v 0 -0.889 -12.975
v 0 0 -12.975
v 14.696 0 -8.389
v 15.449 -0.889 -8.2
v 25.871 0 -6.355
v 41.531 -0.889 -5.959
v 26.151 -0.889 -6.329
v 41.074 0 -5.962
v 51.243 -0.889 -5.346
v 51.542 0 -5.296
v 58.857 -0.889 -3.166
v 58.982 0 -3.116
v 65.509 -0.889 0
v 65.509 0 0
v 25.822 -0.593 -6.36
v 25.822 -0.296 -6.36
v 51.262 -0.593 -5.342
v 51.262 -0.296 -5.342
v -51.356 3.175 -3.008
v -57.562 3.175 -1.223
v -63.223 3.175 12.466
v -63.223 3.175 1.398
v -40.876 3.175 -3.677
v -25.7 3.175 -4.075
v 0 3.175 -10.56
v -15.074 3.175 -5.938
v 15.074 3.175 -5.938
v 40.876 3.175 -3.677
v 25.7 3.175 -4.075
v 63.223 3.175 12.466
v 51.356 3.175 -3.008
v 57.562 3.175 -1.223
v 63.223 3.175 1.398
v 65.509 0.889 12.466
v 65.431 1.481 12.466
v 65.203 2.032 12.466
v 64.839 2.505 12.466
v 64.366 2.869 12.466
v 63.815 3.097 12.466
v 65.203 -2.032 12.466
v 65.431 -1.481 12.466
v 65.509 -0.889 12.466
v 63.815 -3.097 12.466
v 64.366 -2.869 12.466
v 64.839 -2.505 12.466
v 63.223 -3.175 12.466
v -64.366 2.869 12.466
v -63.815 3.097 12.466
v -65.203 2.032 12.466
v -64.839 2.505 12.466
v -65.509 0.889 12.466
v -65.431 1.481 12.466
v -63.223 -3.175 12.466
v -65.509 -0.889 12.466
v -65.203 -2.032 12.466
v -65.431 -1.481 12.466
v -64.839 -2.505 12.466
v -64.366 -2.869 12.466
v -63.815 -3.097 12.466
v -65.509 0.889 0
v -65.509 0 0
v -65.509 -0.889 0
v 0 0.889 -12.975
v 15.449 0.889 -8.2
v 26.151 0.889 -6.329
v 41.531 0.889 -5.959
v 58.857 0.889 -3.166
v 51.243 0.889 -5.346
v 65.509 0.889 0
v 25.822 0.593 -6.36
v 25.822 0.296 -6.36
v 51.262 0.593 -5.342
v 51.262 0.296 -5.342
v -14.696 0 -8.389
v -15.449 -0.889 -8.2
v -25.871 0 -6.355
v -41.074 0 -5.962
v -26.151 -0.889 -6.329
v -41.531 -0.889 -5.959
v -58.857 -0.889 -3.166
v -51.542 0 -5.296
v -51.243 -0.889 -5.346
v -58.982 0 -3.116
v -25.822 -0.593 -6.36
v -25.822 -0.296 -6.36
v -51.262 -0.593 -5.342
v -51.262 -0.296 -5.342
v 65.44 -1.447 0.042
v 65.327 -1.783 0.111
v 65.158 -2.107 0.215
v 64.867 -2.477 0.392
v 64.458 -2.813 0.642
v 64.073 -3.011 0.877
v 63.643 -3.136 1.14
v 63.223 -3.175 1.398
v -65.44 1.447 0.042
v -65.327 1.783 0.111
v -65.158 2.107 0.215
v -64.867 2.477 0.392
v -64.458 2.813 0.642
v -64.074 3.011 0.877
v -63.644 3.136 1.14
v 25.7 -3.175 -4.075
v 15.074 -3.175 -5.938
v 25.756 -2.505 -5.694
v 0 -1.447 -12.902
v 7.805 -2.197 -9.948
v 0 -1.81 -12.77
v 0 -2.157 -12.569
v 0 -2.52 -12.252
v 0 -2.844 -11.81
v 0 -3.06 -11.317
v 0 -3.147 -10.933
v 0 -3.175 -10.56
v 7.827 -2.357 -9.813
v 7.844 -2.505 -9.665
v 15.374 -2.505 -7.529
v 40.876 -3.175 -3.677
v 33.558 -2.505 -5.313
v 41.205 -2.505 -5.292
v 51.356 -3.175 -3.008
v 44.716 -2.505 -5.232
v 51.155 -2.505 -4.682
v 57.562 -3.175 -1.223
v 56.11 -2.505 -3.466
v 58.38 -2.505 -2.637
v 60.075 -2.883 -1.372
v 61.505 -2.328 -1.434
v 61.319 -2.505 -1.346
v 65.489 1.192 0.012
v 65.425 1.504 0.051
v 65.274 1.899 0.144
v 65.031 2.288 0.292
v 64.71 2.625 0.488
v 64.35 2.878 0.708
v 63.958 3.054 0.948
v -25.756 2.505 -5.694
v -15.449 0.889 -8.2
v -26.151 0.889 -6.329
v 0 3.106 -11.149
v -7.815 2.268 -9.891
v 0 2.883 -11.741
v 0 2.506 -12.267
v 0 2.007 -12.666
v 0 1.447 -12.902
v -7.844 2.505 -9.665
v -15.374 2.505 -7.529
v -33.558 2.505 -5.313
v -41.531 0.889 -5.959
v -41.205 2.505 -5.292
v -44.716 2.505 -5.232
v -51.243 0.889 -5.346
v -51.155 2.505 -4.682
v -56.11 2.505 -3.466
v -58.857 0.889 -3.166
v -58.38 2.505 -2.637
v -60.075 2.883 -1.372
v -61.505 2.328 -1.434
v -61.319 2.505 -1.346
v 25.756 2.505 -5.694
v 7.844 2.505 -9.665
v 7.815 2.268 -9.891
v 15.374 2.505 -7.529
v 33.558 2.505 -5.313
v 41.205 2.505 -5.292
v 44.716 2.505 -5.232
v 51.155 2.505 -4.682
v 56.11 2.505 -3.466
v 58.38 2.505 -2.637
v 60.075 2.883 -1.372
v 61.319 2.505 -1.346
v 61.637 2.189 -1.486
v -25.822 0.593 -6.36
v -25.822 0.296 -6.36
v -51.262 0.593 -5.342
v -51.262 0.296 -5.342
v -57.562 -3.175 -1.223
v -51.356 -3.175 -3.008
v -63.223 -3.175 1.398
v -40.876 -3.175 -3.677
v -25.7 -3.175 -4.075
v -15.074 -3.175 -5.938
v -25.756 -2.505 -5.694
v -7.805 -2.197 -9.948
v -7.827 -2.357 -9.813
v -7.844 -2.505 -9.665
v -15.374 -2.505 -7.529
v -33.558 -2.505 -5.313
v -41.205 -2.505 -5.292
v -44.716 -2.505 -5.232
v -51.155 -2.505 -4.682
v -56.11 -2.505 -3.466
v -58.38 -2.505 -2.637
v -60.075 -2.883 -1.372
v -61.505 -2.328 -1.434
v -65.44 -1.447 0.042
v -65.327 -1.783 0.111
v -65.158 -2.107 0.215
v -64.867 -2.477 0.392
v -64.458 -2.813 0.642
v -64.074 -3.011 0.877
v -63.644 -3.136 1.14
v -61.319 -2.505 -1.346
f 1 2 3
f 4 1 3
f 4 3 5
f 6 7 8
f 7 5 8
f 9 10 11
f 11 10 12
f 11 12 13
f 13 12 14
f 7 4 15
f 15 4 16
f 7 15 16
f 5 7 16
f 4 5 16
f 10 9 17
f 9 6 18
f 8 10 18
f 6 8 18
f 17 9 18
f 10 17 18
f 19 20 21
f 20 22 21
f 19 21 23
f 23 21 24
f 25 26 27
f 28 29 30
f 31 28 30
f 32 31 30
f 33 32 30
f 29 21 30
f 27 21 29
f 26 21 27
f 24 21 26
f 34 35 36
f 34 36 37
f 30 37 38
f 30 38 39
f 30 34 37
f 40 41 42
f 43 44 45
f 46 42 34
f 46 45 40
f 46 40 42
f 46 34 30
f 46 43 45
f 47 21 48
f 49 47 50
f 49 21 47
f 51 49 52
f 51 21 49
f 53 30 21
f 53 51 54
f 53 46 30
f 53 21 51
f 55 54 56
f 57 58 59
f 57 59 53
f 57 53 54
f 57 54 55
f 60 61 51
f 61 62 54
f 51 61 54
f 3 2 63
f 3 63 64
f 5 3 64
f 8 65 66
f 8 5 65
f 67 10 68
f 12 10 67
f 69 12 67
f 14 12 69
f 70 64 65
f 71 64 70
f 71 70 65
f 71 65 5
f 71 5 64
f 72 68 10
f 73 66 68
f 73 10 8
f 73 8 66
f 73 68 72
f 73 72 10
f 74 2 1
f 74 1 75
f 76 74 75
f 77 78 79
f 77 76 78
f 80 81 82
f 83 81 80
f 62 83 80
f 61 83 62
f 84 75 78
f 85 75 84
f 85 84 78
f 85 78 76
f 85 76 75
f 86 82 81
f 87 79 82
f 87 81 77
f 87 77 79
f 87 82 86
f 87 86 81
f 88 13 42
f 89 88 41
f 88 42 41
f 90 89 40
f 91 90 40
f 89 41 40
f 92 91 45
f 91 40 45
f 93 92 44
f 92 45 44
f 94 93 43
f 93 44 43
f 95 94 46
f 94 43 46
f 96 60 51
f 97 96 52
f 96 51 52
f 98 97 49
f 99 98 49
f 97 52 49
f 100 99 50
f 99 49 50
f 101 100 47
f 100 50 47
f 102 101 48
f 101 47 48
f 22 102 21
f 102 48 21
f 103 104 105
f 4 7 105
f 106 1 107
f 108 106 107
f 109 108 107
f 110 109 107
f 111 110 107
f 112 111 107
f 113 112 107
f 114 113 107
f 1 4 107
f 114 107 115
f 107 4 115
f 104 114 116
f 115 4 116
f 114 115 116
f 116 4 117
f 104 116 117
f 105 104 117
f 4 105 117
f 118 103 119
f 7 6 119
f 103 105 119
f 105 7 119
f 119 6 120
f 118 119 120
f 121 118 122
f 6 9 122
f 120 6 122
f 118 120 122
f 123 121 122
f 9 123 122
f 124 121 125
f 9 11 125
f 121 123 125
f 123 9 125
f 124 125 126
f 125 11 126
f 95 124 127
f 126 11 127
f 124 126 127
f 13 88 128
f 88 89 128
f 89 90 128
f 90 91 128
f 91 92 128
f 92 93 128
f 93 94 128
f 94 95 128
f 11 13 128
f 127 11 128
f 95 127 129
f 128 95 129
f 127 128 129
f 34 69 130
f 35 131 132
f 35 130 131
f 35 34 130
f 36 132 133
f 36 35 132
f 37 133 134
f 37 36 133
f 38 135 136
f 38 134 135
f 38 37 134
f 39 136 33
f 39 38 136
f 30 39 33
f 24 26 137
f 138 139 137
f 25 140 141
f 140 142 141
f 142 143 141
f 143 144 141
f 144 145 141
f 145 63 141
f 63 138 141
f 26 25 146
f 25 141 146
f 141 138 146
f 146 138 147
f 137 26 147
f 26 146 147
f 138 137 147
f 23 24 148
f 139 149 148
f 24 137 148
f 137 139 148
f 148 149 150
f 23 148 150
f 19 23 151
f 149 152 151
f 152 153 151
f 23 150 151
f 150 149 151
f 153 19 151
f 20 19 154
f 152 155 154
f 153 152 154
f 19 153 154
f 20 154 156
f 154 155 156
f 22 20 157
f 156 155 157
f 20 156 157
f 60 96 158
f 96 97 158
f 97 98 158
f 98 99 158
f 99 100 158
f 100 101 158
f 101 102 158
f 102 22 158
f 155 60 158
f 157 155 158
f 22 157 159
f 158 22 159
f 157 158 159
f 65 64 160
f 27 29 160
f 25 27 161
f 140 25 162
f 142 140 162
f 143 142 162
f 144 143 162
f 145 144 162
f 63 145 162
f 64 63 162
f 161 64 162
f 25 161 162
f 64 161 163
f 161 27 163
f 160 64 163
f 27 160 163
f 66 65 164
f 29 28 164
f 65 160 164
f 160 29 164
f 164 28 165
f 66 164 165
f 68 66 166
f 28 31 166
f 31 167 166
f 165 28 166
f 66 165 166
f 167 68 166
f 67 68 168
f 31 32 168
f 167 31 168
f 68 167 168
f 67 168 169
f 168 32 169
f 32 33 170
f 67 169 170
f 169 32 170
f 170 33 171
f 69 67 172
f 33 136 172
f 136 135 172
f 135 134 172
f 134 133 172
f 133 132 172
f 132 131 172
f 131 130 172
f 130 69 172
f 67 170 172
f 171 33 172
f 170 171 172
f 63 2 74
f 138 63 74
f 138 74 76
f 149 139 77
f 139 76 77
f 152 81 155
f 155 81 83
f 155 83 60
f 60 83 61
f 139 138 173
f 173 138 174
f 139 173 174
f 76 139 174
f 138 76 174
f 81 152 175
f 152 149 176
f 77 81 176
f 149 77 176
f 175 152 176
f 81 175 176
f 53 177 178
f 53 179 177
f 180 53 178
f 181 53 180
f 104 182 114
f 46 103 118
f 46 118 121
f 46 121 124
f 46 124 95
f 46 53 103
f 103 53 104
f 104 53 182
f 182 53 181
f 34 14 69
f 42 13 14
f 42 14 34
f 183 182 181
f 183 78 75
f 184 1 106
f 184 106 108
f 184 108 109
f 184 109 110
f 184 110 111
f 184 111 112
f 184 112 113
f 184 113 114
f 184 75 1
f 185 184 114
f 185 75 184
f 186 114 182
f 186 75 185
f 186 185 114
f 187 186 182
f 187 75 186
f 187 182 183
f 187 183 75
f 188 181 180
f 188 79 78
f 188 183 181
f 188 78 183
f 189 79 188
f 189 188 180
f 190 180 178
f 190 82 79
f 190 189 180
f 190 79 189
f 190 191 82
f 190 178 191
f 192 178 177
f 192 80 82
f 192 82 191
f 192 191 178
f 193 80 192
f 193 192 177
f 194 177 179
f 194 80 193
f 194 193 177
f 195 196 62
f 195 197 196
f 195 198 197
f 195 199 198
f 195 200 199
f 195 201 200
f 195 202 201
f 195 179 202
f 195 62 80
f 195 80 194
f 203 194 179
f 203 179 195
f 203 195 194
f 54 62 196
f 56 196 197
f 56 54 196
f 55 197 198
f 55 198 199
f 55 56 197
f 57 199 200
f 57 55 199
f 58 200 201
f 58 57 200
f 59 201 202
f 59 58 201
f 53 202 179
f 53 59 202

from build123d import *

# Parameters (mm, degrees)
F0_W     = 65.5089840293
F0_H     = 12.4657871202
F1_DEPTH = 3.175
F2_R     = 2.286


with BuildPart() as f1:
    # F0 (on Front) → F1 (new body, symmetric)
    with BuildSketch(Plane.XZ):
        with Locations((32.7544920146, 6.2328935601)):
            Rectangle(F0_W, F0_H)
        with Locations((-32.7544920146, 6.2328935601)):
            Rectangle(F0_W, F0_H)
        with BuildLine():
            Line((65.5089840293, 0), (0, 0))
            Line((0, 0), (0, -12.9745937884))
            add(Edge.make_bspline(
                [(0, -12.9745937884), (8.4051395557, -10.1107367384), (25.0248568997, -4.4479521566), (51.2725717155, -7.3050479768), (61.1865127872, -2.2179646884), (65.5089840293, 0)],
                knots=[0, 0, 0, 0, 0.3659185269, 0.7235409296, 1, 1, 1, 1], degree=3))
        make_face()
        with BuildLine():
            Line((0, -12.9745937884), (0, 0))
            Line((0, 0), (-65.5089840293, 0))
            add(Edge.make_bspline(
                [(0, -12.9745937884), (-8.4051395557, -10.1107367384), (-25.0248568997, -4.4479521566), (-51.2725717155, -7.3050479768), (-61.1865127872, -2.2179646884), (-65.5089840293, 0)],
                knots=[0, 0, 0, 0, 0.3659185269, 0.7235409296, 1, 1, 1, 1], degree=3))
        make_face()
    extrude(amount=F1_DEPTH, both=True)

    # F2
    f2_edges = [f1.edges().sort_by_distance(p)[0] for p in [
        (-32.834886, -3.175, -5.993997),
        (32.834886, -3.175, -5.993997),
        (32.834886, 3.175, -5.993997),
        (-32.834886, 3.175, -5.993997),
        (65.508984, 3.175, 6.232894),
        (65.508984, -3.175, 6.232894),
        (-65.508984, 3.175, 6.232894),
        (-65.508984, -3.175, 6.232894),
    ]]
    fillet(f2_edges, radius=F2_R)


solid = f1.part
